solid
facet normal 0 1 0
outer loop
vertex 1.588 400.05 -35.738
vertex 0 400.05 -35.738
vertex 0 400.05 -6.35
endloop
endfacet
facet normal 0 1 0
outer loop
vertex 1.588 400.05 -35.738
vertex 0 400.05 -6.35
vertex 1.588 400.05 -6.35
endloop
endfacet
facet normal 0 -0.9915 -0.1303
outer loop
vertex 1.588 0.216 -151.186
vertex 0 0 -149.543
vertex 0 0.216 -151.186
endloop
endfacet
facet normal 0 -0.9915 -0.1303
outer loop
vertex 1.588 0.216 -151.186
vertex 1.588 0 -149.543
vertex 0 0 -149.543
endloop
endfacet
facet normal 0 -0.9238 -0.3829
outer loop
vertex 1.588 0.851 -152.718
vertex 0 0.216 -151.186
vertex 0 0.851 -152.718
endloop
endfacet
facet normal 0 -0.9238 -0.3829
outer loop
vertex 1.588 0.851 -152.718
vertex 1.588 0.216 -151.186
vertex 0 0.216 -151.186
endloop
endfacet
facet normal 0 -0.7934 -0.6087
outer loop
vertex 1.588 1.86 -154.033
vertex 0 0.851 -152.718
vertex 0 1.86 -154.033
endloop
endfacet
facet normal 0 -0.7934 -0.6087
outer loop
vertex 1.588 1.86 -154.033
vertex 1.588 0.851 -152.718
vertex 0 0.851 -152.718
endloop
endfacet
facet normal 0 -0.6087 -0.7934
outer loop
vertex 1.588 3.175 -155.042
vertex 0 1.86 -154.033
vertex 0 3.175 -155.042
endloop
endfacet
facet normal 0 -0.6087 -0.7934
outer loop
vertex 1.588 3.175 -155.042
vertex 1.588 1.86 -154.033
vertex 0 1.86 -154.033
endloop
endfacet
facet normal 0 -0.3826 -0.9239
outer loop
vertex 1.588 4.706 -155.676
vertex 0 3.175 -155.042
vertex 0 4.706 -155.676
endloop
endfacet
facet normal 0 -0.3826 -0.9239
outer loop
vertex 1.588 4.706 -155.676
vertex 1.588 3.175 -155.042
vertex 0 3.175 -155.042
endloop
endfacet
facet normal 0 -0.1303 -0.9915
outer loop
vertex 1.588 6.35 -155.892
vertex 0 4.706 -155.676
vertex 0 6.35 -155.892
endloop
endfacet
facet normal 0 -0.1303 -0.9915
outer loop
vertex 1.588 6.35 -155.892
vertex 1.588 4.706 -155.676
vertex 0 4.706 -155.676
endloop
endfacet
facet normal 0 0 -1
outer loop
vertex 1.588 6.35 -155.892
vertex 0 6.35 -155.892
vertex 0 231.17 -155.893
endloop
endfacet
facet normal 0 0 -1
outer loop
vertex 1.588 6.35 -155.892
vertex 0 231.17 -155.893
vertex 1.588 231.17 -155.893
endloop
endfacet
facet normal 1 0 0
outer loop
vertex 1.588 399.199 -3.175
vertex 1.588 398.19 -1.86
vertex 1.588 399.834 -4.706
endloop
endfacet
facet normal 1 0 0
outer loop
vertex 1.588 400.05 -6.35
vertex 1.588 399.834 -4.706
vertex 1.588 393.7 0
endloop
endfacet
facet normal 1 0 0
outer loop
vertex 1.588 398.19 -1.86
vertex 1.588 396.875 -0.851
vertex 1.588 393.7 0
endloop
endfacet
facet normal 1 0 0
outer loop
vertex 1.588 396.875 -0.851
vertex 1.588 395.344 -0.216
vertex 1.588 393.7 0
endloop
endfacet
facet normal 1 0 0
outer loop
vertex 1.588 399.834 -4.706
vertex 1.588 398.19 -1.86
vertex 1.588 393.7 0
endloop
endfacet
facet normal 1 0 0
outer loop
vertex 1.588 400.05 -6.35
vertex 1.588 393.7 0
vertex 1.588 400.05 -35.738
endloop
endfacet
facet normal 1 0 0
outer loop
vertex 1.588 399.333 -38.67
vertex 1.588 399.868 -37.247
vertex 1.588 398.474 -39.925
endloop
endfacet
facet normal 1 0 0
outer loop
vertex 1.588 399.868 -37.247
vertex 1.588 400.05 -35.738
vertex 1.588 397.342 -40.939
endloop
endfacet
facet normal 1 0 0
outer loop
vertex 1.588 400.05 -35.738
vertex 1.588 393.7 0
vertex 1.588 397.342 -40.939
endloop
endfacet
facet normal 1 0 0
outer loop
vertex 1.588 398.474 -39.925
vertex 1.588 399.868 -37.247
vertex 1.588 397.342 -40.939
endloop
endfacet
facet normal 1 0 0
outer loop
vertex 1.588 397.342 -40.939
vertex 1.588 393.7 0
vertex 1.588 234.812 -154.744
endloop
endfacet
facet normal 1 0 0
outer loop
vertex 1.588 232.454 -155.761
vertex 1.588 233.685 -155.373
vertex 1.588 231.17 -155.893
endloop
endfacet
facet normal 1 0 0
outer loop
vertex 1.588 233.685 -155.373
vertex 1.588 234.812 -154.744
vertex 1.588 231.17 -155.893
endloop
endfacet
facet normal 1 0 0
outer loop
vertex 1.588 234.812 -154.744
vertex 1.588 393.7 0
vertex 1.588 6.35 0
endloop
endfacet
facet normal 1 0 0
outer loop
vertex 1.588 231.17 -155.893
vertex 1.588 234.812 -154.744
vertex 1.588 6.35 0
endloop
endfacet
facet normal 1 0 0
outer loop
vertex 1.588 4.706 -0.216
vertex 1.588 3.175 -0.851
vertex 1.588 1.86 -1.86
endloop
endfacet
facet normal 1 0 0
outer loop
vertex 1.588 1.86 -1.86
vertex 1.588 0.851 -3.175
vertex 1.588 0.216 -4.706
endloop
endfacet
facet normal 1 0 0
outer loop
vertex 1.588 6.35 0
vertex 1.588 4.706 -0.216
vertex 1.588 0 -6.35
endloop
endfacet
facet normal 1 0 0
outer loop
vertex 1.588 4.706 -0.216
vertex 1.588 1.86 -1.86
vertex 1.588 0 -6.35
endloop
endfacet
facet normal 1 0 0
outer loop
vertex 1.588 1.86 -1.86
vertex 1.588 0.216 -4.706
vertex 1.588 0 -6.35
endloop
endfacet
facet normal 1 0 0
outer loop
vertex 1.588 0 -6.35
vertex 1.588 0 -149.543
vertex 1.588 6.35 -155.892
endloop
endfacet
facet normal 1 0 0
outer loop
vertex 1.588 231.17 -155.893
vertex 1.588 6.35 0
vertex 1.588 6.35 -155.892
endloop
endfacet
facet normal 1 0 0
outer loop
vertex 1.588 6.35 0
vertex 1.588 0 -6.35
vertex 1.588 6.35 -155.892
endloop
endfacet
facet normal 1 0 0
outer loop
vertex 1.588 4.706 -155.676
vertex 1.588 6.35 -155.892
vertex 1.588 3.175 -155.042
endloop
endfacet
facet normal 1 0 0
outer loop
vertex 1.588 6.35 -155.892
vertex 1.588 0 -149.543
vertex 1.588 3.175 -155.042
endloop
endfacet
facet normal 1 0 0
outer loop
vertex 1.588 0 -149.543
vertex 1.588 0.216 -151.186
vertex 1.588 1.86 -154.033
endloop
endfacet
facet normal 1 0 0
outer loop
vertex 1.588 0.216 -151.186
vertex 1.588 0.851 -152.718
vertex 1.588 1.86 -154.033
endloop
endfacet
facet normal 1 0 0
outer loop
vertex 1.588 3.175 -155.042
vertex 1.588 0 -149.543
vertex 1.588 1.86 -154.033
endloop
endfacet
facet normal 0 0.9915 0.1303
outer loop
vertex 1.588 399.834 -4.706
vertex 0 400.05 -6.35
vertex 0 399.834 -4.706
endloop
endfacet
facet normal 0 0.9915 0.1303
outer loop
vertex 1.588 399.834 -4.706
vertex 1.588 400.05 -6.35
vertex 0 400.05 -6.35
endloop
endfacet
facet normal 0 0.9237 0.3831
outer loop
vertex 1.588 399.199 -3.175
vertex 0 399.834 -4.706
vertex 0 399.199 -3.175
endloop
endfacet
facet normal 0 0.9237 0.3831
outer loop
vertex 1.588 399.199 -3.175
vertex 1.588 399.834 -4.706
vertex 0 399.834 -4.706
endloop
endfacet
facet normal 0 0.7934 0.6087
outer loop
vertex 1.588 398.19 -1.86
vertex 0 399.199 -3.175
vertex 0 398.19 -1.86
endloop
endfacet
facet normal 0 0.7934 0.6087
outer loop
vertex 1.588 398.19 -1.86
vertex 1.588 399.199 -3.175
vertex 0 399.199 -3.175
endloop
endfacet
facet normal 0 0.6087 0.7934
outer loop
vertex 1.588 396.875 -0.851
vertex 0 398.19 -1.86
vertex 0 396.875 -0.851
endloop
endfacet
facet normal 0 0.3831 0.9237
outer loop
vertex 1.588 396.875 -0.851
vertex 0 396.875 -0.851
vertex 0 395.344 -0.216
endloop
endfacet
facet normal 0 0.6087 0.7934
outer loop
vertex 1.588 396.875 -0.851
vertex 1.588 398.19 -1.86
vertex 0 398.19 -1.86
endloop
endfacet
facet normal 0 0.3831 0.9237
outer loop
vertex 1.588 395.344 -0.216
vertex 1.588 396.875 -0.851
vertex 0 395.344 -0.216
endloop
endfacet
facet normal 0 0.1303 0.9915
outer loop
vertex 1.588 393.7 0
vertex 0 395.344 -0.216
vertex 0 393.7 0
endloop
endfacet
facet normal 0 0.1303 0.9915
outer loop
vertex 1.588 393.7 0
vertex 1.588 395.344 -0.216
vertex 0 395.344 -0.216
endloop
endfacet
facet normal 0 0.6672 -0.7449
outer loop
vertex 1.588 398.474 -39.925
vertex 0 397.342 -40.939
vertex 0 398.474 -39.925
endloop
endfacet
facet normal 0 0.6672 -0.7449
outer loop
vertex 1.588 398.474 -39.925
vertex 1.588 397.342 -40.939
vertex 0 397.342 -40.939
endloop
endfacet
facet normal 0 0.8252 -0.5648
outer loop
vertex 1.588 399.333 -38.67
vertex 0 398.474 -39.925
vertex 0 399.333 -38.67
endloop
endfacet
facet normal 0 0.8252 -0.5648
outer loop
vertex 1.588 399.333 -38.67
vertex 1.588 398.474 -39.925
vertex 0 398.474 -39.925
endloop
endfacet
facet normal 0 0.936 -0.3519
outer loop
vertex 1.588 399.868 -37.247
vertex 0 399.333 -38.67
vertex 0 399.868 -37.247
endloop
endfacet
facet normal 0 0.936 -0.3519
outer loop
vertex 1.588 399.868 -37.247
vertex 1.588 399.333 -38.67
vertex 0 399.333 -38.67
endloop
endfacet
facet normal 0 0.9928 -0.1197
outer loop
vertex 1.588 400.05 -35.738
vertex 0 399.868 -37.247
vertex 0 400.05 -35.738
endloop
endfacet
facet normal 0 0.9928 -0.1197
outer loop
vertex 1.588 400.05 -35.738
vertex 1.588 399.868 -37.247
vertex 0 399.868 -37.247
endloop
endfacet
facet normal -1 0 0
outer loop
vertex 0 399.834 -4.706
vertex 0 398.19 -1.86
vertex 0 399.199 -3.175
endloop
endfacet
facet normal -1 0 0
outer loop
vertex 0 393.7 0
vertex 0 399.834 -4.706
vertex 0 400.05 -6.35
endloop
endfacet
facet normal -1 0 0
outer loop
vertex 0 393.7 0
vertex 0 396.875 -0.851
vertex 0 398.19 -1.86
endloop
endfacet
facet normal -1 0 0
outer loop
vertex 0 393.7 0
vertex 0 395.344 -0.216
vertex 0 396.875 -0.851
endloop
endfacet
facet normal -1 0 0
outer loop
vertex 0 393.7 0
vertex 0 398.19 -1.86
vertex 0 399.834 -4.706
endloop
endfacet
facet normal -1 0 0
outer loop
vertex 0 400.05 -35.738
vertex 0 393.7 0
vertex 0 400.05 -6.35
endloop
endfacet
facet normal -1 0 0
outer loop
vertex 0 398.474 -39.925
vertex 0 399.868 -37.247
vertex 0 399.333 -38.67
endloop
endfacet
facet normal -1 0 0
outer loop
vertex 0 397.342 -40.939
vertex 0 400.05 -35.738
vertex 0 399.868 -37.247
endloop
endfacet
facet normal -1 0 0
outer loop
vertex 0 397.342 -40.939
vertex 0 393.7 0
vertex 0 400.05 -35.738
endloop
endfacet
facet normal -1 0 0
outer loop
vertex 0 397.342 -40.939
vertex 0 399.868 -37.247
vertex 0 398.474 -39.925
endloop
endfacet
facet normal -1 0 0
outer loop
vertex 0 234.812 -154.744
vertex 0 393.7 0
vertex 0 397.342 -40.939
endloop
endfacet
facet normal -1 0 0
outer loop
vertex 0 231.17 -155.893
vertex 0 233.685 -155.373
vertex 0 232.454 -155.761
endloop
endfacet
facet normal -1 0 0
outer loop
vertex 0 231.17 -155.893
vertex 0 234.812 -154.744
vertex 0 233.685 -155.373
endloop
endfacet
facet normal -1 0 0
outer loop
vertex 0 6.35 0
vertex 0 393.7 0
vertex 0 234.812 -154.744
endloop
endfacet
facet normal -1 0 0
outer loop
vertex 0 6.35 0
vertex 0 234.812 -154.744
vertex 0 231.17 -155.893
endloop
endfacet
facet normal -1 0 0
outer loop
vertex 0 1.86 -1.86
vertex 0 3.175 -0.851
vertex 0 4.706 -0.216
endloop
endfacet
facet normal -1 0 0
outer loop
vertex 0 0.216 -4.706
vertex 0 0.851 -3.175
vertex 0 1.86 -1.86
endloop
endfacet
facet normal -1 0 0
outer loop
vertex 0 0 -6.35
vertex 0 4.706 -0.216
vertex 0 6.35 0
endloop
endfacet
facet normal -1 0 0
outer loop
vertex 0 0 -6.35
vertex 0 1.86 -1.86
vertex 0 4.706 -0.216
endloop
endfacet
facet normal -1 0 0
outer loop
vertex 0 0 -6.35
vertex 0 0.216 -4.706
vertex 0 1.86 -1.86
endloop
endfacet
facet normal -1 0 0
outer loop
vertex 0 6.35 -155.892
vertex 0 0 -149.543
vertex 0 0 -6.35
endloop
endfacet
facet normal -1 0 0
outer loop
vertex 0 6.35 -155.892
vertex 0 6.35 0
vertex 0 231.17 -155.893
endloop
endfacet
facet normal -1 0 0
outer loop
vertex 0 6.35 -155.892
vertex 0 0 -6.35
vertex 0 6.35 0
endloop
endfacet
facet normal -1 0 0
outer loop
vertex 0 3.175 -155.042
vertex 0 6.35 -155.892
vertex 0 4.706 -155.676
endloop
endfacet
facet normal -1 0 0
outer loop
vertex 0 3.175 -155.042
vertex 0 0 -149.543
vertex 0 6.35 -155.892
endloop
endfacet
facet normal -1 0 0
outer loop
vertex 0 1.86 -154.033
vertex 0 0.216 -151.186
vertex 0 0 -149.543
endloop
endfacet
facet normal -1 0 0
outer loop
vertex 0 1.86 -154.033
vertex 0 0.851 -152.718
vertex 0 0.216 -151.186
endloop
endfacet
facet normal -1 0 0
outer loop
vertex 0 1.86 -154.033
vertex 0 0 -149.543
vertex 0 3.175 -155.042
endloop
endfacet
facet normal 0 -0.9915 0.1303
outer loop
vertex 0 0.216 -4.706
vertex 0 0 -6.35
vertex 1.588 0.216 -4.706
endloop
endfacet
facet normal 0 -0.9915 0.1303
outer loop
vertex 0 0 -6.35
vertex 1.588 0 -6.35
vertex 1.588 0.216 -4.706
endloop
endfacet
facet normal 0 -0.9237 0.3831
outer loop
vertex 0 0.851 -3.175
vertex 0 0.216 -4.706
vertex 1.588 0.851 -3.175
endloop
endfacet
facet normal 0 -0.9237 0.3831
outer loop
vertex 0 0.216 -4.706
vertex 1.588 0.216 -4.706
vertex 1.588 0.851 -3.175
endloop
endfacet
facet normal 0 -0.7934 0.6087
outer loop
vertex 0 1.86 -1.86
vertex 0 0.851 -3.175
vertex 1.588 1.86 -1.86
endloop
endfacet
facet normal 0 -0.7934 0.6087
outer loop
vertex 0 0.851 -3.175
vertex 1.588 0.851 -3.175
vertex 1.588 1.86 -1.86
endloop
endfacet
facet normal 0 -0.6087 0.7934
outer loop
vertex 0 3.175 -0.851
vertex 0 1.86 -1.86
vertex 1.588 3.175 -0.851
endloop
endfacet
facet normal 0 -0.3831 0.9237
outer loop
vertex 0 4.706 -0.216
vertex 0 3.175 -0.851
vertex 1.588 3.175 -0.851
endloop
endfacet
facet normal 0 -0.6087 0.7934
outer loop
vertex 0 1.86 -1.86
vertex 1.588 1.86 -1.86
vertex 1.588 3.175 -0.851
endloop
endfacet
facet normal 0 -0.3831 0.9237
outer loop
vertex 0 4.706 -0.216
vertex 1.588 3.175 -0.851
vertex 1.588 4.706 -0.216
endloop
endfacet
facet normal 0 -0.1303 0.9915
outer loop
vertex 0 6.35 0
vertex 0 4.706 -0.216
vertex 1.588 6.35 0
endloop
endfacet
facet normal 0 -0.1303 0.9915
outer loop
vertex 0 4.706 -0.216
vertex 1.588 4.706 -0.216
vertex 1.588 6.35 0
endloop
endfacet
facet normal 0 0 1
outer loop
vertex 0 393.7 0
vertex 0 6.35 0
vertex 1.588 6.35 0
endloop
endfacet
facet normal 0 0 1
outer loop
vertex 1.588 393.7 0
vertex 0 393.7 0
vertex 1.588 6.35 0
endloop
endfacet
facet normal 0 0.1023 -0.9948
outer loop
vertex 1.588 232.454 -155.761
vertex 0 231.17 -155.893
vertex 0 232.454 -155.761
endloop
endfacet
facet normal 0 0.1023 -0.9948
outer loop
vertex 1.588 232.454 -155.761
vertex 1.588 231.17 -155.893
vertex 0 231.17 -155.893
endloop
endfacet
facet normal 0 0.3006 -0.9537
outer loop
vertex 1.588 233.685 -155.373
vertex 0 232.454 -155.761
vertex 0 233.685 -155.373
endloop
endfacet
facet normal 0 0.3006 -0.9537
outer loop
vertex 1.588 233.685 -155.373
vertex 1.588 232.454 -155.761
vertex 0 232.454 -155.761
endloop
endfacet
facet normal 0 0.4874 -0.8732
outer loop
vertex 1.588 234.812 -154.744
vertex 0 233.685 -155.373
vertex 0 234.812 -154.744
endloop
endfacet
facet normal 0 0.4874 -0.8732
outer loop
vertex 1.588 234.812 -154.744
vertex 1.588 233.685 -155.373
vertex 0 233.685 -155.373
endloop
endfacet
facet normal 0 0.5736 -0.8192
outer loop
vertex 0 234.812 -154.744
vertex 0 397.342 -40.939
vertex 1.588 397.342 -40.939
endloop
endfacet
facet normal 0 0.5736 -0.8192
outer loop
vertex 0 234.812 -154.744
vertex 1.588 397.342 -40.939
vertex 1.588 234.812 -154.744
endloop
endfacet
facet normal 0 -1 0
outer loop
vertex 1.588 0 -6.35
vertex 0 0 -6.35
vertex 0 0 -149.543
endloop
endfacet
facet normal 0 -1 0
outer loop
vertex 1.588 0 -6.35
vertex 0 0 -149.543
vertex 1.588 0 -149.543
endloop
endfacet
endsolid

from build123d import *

# Parameters (mm, degrees)
SKETCH1_W           = 1.5875
SKETCH1_H           = 155.8925
BOSS_EXTRUDE1_DEPTH = 400.05
CUT_EXTRUDE1_DEPTH  = 1.5875
FILLET1_R           = 6.35


with BuildPart() as part:
    # Sketch1 → Boss-Extrude1 (new body)
    with BuildSketch(Plane(origin=(0, 0, 0), x_dir=(1, 0, 0), z_dir=(0, 1, 0))):
        with Locations((0.79375, 77.94625)):
            Rectangle(SKETCH1_W, SKETCH1_H)
    extrude(amount=BOSS_EXTRUDE1_DEPTH)

    # Sketch2 → Cut-Extrude1 (cut)
    with BuildSketch(Plane.ZY):
        Polygon((-39.043266439, 400.05), (-155.8925, 233.172), (-155.8925, 400.05), align=None)
    extrude(amount=-CUT_EXTRUDE1_DEPTH, mode=Mode.SUBTRACT)

    # Fillet1
    fillet1_edges = [part.edges().sort_by_distance(p)[0] for p in [
        (0.79375, 400.05, -39.043266439),
        (0.79375, 233.172, -155.8925),
        (0.79375, 400.05, 0),
        (0.79375, 0, -155.8925),
        (0.79375, 0, 0),
    ]]
    fillet(fillet1_edges, radius=FILLET1_R)


solid = part.part
